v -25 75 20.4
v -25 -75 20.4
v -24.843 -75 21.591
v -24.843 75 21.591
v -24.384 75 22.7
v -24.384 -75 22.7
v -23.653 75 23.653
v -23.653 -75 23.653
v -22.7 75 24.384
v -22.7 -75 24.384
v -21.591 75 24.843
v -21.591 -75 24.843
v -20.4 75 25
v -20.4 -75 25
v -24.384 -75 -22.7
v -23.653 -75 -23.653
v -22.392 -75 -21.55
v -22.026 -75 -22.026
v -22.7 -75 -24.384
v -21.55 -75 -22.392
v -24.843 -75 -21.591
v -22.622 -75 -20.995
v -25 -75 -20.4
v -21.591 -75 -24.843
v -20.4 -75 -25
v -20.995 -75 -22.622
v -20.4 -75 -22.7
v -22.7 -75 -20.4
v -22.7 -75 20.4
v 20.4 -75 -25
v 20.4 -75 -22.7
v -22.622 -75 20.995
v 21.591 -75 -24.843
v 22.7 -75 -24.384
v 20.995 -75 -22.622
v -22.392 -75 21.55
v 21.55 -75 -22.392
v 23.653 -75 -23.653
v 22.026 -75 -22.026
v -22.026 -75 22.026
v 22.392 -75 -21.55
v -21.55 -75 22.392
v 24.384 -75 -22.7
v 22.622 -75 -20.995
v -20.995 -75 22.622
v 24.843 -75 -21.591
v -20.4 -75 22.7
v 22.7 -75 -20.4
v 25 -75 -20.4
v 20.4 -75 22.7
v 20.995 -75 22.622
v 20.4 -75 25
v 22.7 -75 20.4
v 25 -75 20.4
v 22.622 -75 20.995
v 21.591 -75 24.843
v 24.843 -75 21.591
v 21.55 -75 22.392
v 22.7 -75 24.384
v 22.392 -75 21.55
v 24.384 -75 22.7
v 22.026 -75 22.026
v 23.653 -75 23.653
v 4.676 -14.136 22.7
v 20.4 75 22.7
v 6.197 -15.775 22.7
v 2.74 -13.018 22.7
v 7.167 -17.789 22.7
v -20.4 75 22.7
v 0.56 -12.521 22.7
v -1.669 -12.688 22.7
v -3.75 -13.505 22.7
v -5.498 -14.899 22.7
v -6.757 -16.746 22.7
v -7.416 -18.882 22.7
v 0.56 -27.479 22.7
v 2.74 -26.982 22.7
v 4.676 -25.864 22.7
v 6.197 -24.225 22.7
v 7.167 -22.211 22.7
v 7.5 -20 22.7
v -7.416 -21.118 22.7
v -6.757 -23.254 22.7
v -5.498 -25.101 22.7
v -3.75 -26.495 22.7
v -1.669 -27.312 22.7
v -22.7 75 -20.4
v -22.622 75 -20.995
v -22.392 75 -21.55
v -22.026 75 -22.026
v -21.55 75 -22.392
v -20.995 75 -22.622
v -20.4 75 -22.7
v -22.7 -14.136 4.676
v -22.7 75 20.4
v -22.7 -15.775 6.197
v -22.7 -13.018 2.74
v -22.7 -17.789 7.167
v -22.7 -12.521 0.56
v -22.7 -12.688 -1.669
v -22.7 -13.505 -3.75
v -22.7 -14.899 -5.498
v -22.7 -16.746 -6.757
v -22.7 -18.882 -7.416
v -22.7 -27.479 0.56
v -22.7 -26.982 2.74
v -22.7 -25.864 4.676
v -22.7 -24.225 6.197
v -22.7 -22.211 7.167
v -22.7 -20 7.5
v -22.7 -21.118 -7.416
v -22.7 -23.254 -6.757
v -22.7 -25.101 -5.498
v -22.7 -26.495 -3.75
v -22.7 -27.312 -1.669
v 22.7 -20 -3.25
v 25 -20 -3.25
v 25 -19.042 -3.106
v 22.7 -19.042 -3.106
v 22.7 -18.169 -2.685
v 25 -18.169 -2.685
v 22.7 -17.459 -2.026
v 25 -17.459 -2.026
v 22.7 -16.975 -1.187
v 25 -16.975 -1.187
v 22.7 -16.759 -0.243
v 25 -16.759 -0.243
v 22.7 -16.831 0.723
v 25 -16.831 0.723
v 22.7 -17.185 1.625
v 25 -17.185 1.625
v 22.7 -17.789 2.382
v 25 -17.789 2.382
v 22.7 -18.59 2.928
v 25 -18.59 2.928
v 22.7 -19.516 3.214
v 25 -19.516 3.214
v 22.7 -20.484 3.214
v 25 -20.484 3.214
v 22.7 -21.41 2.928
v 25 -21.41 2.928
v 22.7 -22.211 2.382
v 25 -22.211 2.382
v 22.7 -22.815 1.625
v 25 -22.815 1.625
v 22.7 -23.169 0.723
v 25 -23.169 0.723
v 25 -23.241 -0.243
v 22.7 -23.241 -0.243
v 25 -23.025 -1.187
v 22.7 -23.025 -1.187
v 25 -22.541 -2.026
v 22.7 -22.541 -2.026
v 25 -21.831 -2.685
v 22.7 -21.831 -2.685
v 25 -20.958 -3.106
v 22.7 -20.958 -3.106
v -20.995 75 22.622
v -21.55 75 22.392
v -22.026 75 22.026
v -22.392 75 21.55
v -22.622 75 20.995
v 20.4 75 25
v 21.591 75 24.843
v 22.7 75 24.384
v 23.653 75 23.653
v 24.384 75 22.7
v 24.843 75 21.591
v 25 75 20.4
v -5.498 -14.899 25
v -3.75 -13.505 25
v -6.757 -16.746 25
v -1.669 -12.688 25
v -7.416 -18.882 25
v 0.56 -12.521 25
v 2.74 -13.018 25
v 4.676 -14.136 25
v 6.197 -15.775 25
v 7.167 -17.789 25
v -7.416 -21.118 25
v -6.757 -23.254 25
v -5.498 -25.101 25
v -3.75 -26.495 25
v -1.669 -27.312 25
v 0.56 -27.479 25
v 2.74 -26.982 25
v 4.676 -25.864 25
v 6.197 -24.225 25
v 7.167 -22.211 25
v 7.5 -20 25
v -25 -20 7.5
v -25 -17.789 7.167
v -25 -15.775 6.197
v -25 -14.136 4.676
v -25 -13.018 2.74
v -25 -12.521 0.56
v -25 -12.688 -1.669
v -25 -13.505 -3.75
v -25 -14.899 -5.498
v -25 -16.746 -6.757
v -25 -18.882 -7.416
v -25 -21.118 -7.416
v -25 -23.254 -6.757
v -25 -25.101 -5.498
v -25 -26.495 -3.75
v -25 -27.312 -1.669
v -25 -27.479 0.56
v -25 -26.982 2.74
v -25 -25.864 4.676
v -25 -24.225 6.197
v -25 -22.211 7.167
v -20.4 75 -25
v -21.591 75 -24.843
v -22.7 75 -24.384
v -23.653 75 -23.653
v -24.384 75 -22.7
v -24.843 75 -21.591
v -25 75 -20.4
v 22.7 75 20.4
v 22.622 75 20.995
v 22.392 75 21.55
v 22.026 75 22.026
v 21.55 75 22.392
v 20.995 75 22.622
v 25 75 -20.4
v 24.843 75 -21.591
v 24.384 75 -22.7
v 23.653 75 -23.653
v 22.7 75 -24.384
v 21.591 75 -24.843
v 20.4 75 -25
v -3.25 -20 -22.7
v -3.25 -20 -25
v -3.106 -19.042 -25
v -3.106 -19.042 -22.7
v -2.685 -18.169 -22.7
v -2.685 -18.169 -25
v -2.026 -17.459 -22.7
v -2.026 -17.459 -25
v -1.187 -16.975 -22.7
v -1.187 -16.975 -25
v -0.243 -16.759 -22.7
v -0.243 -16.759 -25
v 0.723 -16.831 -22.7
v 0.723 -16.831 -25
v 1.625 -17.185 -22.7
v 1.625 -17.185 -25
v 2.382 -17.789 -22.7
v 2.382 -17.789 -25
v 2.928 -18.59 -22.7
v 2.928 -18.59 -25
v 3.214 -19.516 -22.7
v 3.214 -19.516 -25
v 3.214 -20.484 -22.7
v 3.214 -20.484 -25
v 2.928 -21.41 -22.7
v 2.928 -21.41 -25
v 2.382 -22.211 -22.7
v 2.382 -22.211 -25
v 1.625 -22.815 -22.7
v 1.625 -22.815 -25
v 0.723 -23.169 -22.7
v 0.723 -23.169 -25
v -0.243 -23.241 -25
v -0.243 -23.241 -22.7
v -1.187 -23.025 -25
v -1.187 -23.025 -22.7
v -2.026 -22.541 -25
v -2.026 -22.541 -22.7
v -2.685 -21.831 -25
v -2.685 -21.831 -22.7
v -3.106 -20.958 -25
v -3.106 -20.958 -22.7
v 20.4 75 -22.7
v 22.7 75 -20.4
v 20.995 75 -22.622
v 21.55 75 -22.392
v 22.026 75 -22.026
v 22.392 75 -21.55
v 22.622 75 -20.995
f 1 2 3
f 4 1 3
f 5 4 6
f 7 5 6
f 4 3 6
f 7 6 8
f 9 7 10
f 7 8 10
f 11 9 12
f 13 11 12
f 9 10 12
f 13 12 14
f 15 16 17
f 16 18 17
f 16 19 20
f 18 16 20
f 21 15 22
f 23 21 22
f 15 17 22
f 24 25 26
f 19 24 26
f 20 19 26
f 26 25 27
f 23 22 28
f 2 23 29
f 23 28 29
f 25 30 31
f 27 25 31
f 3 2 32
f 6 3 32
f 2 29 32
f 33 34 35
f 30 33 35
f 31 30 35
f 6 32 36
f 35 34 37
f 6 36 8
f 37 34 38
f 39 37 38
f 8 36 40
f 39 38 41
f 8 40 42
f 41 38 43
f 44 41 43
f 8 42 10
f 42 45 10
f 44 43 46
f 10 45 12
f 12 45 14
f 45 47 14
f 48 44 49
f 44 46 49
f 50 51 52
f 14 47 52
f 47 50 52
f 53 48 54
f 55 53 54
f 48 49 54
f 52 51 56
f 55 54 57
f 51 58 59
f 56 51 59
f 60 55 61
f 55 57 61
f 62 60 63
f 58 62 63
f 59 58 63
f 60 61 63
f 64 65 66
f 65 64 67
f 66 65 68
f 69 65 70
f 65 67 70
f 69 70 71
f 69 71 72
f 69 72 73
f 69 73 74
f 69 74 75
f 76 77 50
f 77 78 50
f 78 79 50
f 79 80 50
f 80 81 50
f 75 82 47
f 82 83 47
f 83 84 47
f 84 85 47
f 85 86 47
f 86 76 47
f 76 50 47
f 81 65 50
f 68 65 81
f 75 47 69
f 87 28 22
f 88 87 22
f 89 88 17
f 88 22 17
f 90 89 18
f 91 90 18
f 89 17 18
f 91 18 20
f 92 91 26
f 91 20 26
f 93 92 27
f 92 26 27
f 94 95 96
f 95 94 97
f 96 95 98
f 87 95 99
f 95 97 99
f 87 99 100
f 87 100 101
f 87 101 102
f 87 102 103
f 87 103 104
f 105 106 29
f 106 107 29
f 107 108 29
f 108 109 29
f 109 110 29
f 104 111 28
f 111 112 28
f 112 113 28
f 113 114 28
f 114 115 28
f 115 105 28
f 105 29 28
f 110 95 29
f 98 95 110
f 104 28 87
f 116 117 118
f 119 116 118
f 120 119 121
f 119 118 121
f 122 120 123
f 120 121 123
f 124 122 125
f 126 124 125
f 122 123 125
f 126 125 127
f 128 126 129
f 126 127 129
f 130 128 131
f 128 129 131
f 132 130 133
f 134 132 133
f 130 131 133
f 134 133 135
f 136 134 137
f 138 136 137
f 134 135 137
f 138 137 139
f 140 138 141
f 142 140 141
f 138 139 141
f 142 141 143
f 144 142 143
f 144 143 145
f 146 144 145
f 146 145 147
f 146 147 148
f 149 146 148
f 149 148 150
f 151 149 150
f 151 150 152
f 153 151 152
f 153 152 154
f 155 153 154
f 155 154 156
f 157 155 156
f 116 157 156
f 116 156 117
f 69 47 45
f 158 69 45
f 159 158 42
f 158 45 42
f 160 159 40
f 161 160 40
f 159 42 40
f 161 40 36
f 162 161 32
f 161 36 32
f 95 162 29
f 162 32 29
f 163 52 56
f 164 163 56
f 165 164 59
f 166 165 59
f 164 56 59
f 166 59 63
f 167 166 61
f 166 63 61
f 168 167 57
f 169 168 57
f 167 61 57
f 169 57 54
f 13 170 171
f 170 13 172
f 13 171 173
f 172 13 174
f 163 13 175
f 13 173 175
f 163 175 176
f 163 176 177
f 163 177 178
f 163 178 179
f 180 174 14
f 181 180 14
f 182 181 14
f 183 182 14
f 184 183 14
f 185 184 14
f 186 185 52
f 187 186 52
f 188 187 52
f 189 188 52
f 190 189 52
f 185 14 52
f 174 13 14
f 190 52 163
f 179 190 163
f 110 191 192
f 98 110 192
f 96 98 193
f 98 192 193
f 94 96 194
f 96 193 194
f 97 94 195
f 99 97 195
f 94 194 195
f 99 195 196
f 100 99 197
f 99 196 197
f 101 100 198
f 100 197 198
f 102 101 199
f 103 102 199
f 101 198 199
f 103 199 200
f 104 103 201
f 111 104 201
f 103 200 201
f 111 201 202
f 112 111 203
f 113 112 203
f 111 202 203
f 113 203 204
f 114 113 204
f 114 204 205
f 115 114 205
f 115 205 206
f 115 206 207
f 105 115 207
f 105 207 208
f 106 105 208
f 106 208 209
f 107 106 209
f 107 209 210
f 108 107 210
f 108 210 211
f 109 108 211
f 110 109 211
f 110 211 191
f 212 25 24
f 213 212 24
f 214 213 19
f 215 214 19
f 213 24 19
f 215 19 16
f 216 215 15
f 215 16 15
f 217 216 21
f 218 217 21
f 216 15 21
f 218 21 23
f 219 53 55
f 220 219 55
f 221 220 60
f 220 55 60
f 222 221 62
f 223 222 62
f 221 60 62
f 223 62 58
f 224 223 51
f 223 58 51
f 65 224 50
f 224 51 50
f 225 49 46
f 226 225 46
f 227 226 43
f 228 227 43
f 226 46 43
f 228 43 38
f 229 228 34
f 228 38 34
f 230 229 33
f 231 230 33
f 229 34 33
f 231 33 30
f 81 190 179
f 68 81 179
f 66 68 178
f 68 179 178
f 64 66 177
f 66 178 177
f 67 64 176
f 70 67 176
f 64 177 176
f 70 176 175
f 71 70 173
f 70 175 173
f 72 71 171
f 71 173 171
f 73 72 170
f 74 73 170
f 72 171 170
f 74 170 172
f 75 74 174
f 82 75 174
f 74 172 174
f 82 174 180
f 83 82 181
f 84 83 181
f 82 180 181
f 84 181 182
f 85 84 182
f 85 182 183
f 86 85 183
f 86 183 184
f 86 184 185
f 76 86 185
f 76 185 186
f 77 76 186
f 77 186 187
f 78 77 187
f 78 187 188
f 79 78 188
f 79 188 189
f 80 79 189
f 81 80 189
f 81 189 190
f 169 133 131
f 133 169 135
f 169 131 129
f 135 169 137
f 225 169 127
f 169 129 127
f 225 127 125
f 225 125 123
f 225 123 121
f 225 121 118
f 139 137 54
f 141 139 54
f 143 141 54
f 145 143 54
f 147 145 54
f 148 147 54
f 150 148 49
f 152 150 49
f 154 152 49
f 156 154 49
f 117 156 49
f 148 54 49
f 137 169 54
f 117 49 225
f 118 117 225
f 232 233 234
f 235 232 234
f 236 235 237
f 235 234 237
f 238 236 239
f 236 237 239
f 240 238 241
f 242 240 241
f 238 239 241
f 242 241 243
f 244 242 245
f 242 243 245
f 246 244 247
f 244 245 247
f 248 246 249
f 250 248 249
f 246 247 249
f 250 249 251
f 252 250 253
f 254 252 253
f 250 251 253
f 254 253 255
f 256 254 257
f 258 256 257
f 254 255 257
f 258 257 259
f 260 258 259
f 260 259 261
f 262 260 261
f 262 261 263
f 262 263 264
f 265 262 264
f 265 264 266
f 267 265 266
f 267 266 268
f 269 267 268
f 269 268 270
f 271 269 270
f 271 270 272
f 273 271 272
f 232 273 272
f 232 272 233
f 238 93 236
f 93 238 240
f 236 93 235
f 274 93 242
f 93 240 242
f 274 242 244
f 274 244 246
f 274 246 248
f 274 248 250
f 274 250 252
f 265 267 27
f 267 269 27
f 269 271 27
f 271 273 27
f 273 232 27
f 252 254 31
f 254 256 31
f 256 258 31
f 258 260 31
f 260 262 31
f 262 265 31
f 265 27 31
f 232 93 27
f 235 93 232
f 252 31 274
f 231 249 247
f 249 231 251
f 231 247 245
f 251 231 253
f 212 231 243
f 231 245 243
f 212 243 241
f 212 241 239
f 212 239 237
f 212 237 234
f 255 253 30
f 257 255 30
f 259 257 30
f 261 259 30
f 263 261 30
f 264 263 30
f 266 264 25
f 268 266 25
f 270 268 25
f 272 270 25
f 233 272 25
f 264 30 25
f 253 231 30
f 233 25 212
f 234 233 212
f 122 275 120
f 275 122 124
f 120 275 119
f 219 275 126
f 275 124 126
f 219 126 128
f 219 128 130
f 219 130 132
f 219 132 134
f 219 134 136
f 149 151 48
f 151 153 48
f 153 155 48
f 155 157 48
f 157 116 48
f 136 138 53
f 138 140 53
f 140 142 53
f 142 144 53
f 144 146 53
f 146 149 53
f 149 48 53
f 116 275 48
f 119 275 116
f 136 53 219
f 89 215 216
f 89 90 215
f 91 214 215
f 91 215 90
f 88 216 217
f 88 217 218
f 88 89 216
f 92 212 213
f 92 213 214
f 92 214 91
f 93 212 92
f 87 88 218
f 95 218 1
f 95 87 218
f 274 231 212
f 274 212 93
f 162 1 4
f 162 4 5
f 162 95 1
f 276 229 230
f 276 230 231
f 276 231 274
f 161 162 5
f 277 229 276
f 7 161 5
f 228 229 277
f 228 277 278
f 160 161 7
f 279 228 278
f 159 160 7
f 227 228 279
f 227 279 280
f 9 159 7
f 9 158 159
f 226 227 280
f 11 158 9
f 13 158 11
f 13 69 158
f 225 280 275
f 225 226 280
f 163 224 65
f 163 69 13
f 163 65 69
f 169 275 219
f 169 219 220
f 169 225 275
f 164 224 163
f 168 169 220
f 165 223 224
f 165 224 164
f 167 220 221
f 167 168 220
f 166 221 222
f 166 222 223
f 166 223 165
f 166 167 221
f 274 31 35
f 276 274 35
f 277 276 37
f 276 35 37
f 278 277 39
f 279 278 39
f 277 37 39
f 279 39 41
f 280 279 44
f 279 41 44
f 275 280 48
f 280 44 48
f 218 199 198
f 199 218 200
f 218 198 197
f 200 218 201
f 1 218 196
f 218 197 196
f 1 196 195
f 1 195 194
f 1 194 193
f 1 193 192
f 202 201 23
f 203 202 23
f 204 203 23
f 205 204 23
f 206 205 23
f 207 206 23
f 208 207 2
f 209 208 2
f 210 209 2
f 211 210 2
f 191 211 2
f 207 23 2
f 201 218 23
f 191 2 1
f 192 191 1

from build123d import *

# Parameters (mm, degrees)
SHS_C450_AS_50X50X2_3_SHS_C450_1_DEPTH = 150
SKETCH12_R                             = 3.25
CUT_EXTRUDE1_DEPTH                     = 10
SKETCH13_R                             = 3.25
CUT_EXTRUDE2_DEPTH                     = 10
SKETCH14_R                             = 7.5
CUT_EXTRUDE3_DEPTH                     = 10
SKETCH15_R                             = 7.5
CUT_EXTRUDE4_DEPTH                     = 10


with BuildPart() as part:
    # Sketch11 → Shs c450 as 50X50X2.3 SHS C450(1) (new body)
    with BuildSketch(Plane.ZX.offset(-75)):
        with BuildLine():
            Line((-20.4, -25), (20.4, -25))
            ThreePointArc((20.4, -25), (23.652691193, -23.652691193), (25, -20.4))
            Line((25, -20.4), (25, 20.4))
            ThreePointArc((25, 20.4), (23.652691193, 23.652691193), (20.4, 25))
            Line((20.4, 25), (-20.4, 25))
            ThreePointArc((-20.4, 25), (-23.652691193, 23.652691193), (-25, 20.4))
            Line((-25, 20.4), (-25, -20.4))
            ThreePointArc((-25, -20.4), (-23.652691193, -23.652691193), (-20.4, -25))
        make_face()
        with BuildLine():
            Line((-20.4, 22.7), (20.4, 22.7))
            ThreePointArc((20.4, 22.7), (22.026345597, 22.026345597), (22.7, 20.4))
            Line((22.7, 20.4), (22.7, -20.4))
            ThreePointArc((22.7, -20.4), (22.026345597, -22.026345597), (20.4, -22.7))
            Line((20.4, -22.7), (-20.4, -22.7))
            ThreePointArc((-20.4, -22.7), (-22.026345597, -22.026345597), (-22.7, -20.4))
            Line((-22.7, -20.4), (-22.7, 20.4))
            ThreePointArc((-22.7, 20.4), (-22.026345597, 22.026345597), (-20.4, 22.7))
        make_face(mode=Mode.SUBTRACT)
    extrude(amount=SHS_C450_AS_50X50X2_3_SHS_C450_1_DEPTH)

    # Sketch12 → Cut-Extrude1 (cut)
    with BuildSketch(Plane(origin=(25, 0, 0), x_dir=(0, 0, -1), z_dir=(1, 0, 0))):
        with Locations((0, -20)):
            Circle(SKETCH12_R)
    extrude(amount=-CUT_EXTRUDE1_DEPTH, mode=Mode.SUBTRACT)

    # Sketch13 → Cut-Extrude2 (cut)
    with BuildSketch(Plane(origin=(0, 0, -25), x_dir=(-1, 0, 0), z_dir=(0, 0, -1))):
        with Locations((0, -20)):
            Circle(SKETCH13_R)
    extrude(amount=-CUT_EXTRUDE2_DEPTH, mode=Mode.SUBTRACT)

    # Sketch14 → Cut-Extrude3 (cut)
    with BuildSketch(Plane.XY.offset(25)):
        with Locations((0, -20)):
            Circle(SKETCH14_R)
    extrude(amount=-CUT_EXTRUDE3_DEPTH, mode=Mode.SUBTRACT)

    # Sketch15 → Cut-Extrude4 (cut)
    with BuildSketch(Plane.ZY.offset(25)):
        with Locations((0, -20)):
            Circle(SKETCH15_R)
    extrude(amount=-CUT_EXTRUDE4_DEPTH, mode=Mode.SUBTRACT)


solid = part.part
